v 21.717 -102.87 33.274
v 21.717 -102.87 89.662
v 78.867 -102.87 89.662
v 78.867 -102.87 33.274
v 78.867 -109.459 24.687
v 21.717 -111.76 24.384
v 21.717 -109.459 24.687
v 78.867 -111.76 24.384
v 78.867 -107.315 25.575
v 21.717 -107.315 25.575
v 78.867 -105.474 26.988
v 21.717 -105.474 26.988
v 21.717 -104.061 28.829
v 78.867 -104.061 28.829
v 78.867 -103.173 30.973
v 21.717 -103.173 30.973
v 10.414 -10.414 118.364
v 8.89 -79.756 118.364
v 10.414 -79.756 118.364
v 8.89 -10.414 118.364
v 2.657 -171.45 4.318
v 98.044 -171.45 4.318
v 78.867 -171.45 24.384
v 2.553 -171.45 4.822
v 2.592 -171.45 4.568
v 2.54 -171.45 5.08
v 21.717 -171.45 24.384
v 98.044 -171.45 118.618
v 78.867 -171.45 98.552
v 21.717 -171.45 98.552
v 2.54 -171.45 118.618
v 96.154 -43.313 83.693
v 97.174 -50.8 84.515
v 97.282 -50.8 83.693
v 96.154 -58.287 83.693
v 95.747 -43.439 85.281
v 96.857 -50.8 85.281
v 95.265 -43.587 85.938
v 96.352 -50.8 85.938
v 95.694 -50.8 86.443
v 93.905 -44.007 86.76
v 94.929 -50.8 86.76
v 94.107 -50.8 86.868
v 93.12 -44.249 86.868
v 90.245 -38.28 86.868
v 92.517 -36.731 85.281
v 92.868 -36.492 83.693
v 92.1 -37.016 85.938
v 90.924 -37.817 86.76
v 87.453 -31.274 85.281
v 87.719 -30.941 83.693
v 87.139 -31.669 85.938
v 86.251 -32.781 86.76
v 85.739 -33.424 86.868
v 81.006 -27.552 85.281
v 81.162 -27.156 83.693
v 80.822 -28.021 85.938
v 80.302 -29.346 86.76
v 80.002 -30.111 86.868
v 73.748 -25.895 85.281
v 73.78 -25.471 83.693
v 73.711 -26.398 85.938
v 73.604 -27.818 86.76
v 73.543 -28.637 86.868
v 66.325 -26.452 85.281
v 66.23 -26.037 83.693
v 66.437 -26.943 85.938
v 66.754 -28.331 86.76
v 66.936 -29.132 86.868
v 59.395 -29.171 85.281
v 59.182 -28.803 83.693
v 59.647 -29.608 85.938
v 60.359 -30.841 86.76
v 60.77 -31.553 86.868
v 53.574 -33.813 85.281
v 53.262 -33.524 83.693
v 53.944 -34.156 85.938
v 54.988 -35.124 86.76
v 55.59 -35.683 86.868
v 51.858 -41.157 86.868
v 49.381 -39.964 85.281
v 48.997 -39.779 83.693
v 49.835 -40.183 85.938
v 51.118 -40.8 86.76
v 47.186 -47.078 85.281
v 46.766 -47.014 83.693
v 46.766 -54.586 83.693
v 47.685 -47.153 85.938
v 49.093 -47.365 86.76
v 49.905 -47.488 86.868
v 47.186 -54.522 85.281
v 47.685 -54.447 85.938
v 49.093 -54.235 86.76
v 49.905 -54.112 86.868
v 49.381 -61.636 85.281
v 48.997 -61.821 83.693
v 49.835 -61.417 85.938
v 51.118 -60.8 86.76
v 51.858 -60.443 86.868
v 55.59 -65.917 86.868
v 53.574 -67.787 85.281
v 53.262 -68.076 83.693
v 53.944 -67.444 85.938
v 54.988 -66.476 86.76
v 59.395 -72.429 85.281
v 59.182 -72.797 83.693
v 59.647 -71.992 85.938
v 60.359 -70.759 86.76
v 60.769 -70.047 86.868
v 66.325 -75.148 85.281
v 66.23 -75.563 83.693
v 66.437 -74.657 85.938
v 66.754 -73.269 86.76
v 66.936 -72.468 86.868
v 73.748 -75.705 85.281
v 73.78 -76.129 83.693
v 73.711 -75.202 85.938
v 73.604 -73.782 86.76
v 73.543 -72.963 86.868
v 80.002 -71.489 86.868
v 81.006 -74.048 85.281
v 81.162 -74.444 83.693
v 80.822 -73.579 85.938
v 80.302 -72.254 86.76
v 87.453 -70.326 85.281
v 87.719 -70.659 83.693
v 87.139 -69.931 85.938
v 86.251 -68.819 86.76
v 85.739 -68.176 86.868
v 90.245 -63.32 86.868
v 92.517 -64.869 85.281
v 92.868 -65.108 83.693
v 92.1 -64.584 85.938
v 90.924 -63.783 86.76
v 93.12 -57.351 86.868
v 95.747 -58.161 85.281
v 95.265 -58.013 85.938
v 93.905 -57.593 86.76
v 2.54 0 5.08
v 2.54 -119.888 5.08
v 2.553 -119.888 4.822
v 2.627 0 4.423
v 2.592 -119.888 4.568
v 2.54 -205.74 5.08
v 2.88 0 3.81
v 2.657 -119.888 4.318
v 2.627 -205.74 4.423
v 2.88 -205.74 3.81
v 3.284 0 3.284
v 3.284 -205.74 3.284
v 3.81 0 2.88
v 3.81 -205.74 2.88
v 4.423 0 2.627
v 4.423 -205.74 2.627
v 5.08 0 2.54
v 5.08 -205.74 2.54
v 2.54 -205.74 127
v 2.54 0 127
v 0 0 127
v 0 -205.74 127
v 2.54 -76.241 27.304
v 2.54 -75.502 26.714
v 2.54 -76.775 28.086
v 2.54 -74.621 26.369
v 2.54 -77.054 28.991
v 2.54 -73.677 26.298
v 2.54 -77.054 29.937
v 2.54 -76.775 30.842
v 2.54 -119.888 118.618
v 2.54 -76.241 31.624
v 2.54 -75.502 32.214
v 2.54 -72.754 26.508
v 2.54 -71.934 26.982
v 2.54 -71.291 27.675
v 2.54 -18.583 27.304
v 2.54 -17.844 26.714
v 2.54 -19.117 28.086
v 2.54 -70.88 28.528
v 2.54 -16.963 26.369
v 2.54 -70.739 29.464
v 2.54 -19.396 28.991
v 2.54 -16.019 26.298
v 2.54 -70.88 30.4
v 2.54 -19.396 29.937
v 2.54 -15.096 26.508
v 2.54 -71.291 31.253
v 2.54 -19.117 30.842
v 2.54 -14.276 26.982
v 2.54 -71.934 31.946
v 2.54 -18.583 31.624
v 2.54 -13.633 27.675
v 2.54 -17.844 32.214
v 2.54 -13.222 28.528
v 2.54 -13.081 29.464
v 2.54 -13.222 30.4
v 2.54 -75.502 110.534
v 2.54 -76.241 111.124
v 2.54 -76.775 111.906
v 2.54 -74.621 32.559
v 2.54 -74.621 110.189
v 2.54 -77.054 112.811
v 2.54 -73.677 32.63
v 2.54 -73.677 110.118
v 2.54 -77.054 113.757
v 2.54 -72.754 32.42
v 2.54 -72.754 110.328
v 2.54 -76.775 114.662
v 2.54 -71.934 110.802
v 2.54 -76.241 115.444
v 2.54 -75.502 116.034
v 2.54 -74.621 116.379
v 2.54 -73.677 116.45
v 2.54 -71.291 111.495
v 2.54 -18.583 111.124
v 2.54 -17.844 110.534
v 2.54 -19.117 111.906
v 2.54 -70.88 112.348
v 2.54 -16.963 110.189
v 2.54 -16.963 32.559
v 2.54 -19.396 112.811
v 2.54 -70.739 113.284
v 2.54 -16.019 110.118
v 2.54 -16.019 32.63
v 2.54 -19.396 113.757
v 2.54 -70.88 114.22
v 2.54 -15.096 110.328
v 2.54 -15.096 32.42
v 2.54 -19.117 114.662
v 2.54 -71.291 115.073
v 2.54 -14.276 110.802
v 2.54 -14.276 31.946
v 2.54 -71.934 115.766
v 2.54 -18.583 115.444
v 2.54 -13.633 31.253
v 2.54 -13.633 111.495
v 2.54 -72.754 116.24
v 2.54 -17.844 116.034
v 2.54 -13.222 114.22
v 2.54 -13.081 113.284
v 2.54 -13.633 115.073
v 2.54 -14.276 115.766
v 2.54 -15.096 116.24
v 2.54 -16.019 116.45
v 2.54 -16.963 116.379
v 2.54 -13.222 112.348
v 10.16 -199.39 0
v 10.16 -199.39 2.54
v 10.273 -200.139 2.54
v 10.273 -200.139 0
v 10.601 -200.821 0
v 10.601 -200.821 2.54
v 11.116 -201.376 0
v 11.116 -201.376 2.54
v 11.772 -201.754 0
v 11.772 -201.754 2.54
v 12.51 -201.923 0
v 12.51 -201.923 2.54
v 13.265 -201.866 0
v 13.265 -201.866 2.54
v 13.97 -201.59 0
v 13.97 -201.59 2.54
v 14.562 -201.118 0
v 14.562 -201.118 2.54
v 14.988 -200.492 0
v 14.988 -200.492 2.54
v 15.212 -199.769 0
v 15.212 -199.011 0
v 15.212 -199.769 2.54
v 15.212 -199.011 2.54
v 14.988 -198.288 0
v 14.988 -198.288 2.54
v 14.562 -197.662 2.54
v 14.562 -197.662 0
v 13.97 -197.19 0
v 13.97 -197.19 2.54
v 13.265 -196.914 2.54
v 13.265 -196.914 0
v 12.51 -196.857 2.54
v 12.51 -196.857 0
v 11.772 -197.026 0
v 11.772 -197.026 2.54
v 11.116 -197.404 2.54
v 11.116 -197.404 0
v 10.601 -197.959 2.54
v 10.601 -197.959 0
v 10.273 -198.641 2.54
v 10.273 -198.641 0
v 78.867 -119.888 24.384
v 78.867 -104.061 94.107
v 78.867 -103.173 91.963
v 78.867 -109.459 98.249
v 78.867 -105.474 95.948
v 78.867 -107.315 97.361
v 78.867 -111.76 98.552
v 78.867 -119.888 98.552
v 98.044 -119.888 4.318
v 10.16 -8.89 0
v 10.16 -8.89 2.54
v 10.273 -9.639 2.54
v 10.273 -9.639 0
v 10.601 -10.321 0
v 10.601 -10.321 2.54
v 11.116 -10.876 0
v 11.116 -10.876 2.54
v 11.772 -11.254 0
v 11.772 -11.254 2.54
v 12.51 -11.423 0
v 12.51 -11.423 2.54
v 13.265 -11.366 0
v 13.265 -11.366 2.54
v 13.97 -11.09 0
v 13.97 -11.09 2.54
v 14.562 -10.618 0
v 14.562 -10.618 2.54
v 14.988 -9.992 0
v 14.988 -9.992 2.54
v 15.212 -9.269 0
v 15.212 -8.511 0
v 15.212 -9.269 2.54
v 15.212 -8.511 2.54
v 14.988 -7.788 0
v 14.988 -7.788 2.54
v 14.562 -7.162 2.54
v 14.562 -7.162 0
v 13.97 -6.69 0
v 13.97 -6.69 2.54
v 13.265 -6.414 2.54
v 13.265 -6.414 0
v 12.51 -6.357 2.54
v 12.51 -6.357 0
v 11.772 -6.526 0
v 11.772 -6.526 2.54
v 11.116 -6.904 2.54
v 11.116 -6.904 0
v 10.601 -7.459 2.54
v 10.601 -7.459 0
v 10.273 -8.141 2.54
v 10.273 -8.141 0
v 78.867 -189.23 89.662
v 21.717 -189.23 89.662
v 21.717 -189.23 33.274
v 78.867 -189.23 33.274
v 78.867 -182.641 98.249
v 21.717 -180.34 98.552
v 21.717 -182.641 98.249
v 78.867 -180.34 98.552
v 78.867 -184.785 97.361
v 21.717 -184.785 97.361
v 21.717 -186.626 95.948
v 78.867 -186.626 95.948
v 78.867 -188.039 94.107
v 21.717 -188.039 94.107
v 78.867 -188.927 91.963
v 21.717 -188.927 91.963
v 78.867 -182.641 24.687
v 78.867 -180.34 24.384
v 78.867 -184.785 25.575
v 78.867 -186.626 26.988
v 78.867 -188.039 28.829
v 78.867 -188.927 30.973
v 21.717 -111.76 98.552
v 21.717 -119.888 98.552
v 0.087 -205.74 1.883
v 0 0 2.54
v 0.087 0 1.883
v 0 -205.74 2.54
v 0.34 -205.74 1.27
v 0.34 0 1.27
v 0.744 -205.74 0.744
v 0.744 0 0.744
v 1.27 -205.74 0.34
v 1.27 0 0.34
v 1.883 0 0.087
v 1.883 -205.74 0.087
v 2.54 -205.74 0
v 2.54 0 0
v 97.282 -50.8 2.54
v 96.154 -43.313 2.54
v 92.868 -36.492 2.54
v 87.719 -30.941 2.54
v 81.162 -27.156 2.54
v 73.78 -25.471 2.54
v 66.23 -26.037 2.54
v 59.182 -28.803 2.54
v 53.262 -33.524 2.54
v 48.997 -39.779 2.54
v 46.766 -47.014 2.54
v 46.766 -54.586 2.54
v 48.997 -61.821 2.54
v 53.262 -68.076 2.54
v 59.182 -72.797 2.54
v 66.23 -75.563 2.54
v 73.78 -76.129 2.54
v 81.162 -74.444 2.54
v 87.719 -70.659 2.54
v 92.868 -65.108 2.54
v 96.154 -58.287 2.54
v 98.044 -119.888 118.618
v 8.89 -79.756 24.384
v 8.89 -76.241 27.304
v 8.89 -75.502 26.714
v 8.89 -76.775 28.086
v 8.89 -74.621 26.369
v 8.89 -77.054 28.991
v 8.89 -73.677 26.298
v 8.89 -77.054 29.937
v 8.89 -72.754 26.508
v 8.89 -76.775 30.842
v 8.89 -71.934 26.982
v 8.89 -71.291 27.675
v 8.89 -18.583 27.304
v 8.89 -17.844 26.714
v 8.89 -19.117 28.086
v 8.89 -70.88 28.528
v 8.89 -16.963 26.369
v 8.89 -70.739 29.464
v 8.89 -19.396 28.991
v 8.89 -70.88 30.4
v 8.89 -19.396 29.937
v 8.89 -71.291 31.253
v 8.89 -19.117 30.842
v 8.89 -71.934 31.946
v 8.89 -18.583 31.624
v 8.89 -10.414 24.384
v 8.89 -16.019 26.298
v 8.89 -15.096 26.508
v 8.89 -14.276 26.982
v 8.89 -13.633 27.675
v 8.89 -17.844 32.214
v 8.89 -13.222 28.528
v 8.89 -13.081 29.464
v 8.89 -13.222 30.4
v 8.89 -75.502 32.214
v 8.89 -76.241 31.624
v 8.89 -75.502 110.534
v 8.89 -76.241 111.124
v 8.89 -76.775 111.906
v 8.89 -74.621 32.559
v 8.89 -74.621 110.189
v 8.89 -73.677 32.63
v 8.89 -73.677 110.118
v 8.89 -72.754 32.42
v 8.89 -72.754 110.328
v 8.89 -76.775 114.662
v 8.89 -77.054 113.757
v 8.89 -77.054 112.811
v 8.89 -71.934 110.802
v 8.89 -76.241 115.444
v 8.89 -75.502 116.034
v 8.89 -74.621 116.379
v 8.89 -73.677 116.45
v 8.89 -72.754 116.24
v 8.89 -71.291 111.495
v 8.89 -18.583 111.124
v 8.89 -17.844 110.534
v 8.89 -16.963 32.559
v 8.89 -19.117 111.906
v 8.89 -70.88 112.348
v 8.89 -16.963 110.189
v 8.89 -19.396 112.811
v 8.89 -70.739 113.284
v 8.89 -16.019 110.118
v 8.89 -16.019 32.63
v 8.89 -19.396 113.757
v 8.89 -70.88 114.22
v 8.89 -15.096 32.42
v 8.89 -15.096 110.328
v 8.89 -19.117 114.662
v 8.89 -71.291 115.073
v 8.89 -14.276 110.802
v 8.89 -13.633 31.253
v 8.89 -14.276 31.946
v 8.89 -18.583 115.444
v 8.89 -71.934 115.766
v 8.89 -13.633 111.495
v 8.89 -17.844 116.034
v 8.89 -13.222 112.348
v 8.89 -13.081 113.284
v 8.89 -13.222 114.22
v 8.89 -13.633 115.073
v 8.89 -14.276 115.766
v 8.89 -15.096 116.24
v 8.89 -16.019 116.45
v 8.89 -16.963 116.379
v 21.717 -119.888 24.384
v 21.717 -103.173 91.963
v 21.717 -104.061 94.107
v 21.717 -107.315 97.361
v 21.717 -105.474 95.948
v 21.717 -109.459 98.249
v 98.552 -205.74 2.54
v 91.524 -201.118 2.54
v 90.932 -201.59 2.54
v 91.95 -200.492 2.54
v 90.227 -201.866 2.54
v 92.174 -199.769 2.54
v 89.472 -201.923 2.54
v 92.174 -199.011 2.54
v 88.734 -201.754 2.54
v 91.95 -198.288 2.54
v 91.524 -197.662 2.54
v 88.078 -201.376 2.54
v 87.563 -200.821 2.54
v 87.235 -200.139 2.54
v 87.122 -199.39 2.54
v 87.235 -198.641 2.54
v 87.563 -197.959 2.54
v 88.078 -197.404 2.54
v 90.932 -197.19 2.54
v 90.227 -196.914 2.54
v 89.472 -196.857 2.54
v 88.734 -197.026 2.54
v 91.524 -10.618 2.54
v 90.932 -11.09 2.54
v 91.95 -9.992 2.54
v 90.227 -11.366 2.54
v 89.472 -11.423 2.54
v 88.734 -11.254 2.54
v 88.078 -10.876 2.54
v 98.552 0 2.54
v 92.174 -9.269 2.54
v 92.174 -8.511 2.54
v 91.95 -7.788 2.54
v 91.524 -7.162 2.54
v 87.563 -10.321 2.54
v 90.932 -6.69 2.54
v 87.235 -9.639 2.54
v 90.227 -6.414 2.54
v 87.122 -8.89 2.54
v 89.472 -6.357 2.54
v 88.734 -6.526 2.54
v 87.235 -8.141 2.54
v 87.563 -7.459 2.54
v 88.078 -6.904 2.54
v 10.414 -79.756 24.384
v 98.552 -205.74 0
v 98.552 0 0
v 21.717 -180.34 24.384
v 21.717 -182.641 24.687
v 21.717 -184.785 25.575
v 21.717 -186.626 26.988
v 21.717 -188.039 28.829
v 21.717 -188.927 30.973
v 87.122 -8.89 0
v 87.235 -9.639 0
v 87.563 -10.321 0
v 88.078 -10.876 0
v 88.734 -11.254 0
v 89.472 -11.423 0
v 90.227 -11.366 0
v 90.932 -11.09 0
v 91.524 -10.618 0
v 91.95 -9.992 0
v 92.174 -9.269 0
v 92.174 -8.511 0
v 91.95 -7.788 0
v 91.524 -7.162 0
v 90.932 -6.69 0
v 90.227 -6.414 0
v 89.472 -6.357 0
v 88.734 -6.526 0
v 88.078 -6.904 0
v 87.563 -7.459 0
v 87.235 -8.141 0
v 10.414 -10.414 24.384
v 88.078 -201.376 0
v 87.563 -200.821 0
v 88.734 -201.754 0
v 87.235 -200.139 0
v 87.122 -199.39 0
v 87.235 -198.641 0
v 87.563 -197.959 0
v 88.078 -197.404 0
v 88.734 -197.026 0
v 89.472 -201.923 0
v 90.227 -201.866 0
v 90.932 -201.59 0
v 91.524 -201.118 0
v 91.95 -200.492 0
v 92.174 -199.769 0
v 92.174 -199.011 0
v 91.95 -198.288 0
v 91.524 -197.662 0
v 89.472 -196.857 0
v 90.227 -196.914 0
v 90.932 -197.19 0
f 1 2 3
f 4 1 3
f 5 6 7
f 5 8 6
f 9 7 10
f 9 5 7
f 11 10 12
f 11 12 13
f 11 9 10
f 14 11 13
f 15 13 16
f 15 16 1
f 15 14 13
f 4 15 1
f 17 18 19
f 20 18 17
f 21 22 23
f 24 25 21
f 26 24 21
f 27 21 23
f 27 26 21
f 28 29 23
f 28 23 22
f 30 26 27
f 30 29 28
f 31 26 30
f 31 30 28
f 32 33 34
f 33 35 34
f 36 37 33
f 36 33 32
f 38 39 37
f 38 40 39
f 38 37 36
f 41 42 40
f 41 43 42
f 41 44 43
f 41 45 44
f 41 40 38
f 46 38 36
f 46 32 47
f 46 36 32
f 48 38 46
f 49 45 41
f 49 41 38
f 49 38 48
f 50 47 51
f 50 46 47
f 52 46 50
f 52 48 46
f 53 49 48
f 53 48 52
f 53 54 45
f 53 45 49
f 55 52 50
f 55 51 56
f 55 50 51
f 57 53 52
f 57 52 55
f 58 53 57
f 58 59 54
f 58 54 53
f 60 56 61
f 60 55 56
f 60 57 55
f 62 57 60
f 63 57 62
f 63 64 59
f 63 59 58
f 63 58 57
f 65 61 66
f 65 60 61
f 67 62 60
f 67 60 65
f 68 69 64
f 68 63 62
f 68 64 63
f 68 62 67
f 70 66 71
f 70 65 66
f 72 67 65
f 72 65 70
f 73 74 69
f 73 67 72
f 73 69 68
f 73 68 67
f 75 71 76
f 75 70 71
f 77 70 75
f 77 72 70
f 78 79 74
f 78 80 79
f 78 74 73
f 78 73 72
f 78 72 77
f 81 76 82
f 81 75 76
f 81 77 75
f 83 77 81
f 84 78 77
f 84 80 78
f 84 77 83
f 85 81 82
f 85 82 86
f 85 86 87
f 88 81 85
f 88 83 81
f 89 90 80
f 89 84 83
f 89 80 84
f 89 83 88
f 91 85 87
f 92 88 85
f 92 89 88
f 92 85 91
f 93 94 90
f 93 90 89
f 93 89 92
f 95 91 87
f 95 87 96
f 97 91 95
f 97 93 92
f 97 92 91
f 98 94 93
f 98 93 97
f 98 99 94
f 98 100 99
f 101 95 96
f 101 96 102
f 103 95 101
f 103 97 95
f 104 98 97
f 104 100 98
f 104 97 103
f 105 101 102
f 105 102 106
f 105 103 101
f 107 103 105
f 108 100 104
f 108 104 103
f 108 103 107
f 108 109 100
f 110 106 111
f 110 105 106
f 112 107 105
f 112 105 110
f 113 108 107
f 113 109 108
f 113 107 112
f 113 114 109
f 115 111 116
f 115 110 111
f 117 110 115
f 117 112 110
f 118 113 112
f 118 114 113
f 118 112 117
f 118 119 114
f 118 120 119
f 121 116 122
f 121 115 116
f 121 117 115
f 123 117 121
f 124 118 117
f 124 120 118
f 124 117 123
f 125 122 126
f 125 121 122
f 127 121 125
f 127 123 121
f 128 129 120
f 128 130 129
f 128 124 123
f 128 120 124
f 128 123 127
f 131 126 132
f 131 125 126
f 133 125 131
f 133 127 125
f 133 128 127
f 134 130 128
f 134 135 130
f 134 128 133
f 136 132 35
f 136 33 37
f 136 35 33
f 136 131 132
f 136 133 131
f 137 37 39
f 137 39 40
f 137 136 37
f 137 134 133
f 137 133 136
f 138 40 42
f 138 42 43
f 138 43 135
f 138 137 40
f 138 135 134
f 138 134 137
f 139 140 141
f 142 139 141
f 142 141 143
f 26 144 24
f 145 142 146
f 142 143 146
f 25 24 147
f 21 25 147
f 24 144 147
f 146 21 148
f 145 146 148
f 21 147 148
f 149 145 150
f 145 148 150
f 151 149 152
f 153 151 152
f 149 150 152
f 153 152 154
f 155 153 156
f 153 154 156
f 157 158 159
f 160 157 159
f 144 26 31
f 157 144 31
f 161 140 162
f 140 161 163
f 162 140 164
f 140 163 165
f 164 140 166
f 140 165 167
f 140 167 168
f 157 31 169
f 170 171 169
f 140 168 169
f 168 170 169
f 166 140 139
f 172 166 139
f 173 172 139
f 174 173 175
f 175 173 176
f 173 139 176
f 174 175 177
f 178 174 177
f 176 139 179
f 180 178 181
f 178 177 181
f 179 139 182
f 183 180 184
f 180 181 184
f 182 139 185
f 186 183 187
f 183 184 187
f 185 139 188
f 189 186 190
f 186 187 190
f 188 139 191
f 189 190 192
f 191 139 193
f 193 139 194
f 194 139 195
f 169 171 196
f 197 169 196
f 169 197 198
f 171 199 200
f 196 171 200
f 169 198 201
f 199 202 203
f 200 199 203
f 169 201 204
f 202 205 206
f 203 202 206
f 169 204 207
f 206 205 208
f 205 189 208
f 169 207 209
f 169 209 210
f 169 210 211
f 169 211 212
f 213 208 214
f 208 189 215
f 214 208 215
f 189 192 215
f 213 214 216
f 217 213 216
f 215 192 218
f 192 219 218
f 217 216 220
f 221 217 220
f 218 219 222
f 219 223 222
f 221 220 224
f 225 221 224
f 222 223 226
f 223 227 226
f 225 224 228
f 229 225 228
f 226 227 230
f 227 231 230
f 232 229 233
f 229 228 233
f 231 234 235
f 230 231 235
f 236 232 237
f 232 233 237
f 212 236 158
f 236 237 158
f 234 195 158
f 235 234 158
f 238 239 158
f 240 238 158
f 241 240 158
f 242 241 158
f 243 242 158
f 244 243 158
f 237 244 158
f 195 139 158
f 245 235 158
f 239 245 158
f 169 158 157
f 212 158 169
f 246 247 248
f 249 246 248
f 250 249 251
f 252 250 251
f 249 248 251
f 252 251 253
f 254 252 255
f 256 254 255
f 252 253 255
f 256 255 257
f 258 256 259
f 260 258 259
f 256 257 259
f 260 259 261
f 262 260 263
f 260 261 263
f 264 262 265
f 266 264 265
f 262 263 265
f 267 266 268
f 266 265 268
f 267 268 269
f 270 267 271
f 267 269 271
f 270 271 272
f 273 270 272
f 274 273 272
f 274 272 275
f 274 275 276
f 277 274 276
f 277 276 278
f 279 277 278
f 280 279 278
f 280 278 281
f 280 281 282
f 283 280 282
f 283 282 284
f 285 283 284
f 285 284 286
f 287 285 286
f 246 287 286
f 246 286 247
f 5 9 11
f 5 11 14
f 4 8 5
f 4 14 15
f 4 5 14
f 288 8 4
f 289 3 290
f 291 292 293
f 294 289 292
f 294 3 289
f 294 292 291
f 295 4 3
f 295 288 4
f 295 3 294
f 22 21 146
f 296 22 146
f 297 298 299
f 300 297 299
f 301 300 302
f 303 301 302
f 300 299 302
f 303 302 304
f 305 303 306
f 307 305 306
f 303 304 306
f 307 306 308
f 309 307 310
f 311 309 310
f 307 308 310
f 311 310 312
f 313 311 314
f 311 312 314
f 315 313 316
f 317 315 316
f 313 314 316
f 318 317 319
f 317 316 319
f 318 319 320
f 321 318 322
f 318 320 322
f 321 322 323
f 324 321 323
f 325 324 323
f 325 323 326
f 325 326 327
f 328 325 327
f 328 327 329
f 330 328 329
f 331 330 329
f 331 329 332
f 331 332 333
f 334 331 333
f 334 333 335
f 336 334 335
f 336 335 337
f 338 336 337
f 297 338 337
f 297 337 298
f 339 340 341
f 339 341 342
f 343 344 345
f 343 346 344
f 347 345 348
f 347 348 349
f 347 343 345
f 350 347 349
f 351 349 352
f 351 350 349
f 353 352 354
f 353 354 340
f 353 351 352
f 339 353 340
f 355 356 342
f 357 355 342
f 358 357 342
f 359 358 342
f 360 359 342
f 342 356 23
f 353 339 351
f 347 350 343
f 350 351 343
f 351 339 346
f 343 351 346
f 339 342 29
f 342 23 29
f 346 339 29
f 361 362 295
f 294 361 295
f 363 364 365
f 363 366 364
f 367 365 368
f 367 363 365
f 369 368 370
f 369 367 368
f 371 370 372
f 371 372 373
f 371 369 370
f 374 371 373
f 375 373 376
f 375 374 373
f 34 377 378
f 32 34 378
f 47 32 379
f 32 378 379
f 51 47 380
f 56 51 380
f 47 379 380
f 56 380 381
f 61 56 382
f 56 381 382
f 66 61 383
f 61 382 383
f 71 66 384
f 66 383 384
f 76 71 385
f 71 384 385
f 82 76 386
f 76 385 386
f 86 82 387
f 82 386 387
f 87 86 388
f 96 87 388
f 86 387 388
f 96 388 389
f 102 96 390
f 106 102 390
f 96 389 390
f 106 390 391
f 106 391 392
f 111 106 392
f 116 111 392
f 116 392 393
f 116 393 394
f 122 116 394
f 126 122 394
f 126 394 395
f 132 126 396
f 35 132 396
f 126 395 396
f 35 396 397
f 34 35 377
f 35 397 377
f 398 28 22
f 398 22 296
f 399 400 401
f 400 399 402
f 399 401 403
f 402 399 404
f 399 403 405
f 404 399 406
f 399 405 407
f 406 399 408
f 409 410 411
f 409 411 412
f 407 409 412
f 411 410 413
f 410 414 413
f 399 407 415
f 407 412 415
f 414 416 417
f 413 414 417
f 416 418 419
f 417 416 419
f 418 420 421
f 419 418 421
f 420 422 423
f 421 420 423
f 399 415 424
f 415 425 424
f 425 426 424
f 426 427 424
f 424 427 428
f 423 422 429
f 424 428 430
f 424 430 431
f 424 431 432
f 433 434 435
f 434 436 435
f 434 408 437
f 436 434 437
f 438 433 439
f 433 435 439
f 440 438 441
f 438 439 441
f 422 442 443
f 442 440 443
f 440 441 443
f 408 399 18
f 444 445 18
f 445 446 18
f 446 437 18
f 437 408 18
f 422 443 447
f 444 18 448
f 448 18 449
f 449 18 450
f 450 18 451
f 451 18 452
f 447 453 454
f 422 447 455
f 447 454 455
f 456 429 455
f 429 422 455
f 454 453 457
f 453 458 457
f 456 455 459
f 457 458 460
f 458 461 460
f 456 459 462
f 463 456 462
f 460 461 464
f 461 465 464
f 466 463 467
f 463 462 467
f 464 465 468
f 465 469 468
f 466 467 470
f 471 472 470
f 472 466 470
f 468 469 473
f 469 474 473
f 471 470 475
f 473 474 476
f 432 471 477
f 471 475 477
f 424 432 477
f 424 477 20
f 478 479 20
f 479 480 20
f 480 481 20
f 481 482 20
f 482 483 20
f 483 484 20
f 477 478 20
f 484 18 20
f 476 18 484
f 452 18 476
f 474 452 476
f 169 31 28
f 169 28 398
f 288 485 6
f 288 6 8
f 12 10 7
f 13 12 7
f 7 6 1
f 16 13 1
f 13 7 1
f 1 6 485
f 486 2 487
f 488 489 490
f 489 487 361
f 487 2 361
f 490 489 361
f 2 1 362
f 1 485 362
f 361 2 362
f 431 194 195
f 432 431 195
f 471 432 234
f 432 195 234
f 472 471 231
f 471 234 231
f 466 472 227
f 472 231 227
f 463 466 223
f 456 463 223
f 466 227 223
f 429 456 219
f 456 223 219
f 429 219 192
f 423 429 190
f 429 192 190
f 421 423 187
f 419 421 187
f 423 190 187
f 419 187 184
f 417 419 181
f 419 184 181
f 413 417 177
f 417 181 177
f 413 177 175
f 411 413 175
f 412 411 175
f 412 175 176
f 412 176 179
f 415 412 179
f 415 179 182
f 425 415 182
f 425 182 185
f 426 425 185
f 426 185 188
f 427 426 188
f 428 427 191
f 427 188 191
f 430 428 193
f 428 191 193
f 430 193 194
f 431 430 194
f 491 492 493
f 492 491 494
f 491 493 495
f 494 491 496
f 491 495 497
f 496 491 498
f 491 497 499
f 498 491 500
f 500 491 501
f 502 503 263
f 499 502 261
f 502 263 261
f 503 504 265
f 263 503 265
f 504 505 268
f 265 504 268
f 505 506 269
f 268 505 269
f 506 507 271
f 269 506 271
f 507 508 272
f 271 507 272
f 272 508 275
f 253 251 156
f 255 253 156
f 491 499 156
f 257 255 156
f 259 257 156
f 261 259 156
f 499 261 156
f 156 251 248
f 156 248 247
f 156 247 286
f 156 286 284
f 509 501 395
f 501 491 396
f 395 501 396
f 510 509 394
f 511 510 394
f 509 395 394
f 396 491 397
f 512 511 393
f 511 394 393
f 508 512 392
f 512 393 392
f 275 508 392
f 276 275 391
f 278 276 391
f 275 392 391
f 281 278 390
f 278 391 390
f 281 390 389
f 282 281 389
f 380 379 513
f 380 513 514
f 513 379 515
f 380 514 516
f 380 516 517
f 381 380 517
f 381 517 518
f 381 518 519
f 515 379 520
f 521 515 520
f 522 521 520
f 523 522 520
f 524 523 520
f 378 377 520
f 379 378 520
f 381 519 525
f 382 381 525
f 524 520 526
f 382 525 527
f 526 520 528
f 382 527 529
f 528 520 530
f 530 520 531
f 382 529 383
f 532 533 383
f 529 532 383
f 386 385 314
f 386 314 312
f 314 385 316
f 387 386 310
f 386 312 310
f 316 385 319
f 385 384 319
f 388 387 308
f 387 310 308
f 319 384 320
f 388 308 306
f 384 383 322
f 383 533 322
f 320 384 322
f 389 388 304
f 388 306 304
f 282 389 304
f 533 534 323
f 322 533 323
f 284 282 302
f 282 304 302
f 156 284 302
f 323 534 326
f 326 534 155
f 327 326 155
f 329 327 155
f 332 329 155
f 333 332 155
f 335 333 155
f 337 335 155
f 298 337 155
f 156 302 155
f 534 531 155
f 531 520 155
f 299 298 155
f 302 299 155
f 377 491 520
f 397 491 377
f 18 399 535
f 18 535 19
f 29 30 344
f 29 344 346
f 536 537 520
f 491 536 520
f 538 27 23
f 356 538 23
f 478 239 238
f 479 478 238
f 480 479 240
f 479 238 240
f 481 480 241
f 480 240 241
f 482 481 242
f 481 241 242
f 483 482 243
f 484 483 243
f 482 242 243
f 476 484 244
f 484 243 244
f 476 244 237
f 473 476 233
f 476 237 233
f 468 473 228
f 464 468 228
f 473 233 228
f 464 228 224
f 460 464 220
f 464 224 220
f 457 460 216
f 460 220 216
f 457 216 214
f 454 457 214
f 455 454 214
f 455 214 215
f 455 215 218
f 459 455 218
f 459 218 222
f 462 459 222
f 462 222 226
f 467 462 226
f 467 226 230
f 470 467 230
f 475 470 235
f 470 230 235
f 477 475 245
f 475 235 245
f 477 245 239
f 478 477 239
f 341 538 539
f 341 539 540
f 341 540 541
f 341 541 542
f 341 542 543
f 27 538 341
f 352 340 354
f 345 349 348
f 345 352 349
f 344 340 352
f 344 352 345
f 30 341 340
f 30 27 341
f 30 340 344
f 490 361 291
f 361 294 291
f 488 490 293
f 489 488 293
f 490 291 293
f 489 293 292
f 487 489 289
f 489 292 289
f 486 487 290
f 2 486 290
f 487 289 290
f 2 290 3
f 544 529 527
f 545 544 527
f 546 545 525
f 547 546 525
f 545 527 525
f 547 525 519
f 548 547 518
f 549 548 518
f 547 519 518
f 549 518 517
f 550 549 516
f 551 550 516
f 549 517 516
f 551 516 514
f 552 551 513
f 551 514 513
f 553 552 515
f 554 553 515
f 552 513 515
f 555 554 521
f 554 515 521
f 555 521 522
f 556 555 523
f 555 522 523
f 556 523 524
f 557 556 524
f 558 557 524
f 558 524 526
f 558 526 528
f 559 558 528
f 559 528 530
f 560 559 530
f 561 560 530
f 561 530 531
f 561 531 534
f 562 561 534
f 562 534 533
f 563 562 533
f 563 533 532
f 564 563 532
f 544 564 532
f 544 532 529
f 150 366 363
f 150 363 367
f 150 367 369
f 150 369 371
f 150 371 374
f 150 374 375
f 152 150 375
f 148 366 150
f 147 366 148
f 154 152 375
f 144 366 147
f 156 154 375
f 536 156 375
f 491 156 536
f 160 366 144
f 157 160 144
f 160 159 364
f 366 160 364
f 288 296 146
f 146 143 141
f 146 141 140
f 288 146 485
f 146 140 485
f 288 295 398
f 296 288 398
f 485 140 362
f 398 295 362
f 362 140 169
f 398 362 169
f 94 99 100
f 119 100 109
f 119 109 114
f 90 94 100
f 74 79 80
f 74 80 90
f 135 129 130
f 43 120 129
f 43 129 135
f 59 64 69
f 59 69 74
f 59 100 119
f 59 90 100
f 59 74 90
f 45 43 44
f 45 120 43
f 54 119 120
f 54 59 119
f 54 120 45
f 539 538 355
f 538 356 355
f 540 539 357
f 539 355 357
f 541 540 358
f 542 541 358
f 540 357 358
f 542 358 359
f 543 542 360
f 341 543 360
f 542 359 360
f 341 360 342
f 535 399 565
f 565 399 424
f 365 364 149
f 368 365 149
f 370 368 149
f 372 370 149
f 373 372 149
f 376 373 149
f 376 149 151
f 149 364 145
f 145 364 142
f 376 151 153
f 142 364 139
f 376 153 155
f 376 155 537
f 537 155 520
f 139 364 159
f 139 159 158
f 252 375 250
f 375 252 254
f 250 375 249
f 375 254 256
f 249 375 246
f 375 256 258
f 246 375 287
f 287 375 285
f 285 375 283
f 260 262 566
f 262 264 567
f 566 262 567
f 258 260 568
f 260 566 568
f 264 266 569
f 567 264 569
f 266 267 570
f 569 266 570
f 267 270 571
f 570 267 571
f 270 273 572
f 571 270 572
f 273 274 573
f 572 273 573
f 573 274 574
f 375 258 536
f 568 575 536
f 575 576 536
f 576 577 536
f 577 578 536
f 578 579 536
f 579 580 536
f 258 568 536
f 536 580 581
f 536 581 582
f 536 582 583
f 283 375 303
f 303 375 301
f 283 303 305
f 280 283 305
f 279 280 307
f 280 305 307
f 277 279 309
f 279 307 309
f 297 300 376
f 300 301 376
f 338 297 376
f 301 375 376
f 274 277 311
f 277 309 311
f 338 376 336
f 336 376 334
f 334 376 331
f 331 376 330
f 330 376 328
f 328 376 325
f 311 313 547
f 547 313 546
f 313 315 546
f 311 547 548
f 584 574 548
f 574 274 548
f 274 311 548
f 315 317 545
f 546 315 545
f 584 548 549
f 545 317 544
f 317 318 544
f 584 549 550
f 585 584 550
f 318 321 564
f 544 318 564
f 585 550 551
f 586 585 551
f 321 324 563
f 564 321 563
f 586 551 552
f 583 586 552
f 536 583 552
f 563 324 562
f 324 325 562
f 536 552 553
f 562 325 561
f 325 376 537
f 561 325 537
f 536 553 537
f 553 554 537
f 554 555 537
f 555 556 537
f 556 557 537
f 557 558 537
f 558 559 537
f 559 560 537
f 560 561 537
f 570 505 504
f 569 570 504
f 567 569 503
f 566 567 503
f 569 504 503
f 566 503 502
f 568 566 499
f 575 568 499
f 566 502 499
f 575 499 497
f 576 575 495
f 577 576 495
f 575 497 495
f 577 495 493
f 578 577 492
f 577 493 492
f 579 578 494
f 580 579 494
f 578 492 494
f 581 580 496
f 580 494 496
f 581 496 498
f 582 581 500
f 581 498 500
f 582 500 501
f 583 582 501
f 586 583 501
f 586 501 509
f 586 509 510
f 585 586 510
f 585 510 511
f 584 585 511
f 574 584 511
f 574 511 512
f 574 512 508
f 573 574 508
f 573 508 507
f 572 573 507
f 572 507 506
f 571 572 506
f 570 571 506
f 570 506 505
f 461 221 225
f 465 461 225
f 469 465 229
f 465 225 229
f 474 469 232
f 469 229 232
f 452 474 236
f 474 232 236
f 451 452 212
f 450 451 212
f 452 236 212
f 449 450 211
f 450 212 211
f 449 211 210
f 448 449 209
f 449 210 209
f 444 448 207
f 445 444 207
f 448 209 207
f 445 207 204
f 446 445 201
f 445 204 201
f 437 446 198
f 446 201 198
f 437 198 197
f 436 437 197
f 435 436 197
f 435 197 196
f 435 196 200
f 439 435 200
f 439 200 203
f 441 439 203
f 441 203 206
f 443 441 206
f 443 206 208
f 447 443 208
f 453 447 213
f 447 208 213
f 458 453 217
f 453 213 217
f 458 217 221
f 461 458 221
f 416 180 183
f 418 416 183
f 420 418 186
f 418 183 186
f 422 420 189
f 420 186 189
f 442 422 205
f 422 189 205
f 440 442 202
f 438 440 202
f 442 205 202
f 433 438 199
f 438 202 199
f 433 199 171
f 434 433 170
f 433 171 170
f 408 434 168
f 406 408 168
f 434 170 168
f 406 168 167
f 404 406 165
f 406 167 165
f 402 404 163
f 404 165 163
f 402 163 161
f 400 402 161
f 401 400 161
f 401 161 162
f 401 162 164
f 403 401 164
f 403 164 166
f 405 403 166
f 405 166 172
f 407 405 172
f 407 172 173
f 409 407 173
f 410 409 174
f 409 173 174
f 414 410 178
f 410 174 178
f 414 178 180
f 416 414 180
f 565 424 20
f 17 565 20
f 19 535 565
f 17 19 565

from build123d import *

# Parameters (mm, degrees)
F1_DEPTH      = 205.74
F3_D          = 5.08
F4_R          = 2.54
F5_W          = 51.562
F5_H          = 114.3
F6_DEPTH      = 95.504
F7_W          = 57.15
F7_H          = 74.168
F8_DEPTH      = 17.78
F8_DEPTH_BACK = 68.58
F9_R          = 25.4
F10_DEPTH     = 84.328
F11_R         = 3.175
F12_R         = 8.89
F13_R         = 3.175
F14_DEPTH     = 6.35
F15_W         = 69.342
F15_H         = 93.98
F16_DEPTH     = 1.524


with BuildPart() as f1:
    # F0 (on Front) → F1 (new body)
    with BuildSketch(Plane.XZ):
        Polygon((0, 127), (0, 0), (98.552, 0), (98.552, 2.54), (2.54, 2.54), (2.54, 127), align=None)
    extrude(amount=F1_DEPTH)

    # F3 (through all)
    with Locations(Plane(origin=(0, 0, 0), x_dir=(1, 0, 0), z_dir=(0, 0, -1))):
        with Locations((12.7, 199.39), (89.662, 199.39), (89.662, 8.89), (12.7, 8.89)):
            Hole(F3_D / 2)

    # F4
    f4_edges = [f1.edges().sort_by_distance(p)[0] for p in [
        (0, -102.87, 0),
        (2.54, -102.87, 2.54),
    ]]
    fillet(f4_edges, radius=F4_R)

    # F5 (on face) → F6 (join)
    with BuildSketch(Plane.YZ.offset(2.54)):
        with Locations((-145.669, 61.468)):
            Rectangle(F5_W, F5_H)
    extrude(amount=F6_DEPTH)

    # F7 (on face) → F8 (join, two sides)
    with BuildSketch(Plane.XZ.offset(171.45)) as f8_sk:
        with Locations((50.292, 61.468)):
            Rectangle(F7_W, F7_H)
    extrude(amount=F8_DEPTH)
    extrude(f8_sk.sketch, amount=-F8_DEPTH_BACK)

    # F9 (on face) → F10 (join)
    with BuildSketch(Plane.XY.offset(2.54)):
        with Locations((71.882, -50.8)):
            Circle(F9_R)
    extrude(amount=F10_DEPTH)

    # F11
    f11_edges = [f1.edges().sort_by_distance(p)[0] for p in [
        (46.482, -50.8, 86.868),
    ]]
    fillet(f11_edges, radius=F11_R)

    # F12
    f12_edges = [f1.edges().sort_by_distance(p)[0] for p in [
        (50.292, -189.23, 98.552),
        (50.292, -189.23, 24.384),
        (50.292, -102.87, 98.552),
        (50.292, -102.87, 24.384),
    ]]
    fillet(f12_edges, radius=F12_R)

    # F13 (on face) → F14 (join)
    with BuildSketch(Plane.YZ.offset(2.54)):
        with Locations((-73.914, 113.284)):
            Circle(F13_R)
        with Locations((-16.256, 113.284)):
            Circle(F13_R)
        with Locations((-16.256, 29.464)):
            Circle(F13_R)
        with Locations((-73.914, 29.464)):
            Circle(F13_R)
    extrude(amount=F14_DEPTH)

    # F15 (on face) → F16 (join)
    with BuildSketch(Plane.YZ.offset(8.89)):
        with Locations((-45.085, 71.374)):
            Rectangle(F15_W, F15_H)
    extrude(amount=F16_DEPTH)


solid = f1.part
